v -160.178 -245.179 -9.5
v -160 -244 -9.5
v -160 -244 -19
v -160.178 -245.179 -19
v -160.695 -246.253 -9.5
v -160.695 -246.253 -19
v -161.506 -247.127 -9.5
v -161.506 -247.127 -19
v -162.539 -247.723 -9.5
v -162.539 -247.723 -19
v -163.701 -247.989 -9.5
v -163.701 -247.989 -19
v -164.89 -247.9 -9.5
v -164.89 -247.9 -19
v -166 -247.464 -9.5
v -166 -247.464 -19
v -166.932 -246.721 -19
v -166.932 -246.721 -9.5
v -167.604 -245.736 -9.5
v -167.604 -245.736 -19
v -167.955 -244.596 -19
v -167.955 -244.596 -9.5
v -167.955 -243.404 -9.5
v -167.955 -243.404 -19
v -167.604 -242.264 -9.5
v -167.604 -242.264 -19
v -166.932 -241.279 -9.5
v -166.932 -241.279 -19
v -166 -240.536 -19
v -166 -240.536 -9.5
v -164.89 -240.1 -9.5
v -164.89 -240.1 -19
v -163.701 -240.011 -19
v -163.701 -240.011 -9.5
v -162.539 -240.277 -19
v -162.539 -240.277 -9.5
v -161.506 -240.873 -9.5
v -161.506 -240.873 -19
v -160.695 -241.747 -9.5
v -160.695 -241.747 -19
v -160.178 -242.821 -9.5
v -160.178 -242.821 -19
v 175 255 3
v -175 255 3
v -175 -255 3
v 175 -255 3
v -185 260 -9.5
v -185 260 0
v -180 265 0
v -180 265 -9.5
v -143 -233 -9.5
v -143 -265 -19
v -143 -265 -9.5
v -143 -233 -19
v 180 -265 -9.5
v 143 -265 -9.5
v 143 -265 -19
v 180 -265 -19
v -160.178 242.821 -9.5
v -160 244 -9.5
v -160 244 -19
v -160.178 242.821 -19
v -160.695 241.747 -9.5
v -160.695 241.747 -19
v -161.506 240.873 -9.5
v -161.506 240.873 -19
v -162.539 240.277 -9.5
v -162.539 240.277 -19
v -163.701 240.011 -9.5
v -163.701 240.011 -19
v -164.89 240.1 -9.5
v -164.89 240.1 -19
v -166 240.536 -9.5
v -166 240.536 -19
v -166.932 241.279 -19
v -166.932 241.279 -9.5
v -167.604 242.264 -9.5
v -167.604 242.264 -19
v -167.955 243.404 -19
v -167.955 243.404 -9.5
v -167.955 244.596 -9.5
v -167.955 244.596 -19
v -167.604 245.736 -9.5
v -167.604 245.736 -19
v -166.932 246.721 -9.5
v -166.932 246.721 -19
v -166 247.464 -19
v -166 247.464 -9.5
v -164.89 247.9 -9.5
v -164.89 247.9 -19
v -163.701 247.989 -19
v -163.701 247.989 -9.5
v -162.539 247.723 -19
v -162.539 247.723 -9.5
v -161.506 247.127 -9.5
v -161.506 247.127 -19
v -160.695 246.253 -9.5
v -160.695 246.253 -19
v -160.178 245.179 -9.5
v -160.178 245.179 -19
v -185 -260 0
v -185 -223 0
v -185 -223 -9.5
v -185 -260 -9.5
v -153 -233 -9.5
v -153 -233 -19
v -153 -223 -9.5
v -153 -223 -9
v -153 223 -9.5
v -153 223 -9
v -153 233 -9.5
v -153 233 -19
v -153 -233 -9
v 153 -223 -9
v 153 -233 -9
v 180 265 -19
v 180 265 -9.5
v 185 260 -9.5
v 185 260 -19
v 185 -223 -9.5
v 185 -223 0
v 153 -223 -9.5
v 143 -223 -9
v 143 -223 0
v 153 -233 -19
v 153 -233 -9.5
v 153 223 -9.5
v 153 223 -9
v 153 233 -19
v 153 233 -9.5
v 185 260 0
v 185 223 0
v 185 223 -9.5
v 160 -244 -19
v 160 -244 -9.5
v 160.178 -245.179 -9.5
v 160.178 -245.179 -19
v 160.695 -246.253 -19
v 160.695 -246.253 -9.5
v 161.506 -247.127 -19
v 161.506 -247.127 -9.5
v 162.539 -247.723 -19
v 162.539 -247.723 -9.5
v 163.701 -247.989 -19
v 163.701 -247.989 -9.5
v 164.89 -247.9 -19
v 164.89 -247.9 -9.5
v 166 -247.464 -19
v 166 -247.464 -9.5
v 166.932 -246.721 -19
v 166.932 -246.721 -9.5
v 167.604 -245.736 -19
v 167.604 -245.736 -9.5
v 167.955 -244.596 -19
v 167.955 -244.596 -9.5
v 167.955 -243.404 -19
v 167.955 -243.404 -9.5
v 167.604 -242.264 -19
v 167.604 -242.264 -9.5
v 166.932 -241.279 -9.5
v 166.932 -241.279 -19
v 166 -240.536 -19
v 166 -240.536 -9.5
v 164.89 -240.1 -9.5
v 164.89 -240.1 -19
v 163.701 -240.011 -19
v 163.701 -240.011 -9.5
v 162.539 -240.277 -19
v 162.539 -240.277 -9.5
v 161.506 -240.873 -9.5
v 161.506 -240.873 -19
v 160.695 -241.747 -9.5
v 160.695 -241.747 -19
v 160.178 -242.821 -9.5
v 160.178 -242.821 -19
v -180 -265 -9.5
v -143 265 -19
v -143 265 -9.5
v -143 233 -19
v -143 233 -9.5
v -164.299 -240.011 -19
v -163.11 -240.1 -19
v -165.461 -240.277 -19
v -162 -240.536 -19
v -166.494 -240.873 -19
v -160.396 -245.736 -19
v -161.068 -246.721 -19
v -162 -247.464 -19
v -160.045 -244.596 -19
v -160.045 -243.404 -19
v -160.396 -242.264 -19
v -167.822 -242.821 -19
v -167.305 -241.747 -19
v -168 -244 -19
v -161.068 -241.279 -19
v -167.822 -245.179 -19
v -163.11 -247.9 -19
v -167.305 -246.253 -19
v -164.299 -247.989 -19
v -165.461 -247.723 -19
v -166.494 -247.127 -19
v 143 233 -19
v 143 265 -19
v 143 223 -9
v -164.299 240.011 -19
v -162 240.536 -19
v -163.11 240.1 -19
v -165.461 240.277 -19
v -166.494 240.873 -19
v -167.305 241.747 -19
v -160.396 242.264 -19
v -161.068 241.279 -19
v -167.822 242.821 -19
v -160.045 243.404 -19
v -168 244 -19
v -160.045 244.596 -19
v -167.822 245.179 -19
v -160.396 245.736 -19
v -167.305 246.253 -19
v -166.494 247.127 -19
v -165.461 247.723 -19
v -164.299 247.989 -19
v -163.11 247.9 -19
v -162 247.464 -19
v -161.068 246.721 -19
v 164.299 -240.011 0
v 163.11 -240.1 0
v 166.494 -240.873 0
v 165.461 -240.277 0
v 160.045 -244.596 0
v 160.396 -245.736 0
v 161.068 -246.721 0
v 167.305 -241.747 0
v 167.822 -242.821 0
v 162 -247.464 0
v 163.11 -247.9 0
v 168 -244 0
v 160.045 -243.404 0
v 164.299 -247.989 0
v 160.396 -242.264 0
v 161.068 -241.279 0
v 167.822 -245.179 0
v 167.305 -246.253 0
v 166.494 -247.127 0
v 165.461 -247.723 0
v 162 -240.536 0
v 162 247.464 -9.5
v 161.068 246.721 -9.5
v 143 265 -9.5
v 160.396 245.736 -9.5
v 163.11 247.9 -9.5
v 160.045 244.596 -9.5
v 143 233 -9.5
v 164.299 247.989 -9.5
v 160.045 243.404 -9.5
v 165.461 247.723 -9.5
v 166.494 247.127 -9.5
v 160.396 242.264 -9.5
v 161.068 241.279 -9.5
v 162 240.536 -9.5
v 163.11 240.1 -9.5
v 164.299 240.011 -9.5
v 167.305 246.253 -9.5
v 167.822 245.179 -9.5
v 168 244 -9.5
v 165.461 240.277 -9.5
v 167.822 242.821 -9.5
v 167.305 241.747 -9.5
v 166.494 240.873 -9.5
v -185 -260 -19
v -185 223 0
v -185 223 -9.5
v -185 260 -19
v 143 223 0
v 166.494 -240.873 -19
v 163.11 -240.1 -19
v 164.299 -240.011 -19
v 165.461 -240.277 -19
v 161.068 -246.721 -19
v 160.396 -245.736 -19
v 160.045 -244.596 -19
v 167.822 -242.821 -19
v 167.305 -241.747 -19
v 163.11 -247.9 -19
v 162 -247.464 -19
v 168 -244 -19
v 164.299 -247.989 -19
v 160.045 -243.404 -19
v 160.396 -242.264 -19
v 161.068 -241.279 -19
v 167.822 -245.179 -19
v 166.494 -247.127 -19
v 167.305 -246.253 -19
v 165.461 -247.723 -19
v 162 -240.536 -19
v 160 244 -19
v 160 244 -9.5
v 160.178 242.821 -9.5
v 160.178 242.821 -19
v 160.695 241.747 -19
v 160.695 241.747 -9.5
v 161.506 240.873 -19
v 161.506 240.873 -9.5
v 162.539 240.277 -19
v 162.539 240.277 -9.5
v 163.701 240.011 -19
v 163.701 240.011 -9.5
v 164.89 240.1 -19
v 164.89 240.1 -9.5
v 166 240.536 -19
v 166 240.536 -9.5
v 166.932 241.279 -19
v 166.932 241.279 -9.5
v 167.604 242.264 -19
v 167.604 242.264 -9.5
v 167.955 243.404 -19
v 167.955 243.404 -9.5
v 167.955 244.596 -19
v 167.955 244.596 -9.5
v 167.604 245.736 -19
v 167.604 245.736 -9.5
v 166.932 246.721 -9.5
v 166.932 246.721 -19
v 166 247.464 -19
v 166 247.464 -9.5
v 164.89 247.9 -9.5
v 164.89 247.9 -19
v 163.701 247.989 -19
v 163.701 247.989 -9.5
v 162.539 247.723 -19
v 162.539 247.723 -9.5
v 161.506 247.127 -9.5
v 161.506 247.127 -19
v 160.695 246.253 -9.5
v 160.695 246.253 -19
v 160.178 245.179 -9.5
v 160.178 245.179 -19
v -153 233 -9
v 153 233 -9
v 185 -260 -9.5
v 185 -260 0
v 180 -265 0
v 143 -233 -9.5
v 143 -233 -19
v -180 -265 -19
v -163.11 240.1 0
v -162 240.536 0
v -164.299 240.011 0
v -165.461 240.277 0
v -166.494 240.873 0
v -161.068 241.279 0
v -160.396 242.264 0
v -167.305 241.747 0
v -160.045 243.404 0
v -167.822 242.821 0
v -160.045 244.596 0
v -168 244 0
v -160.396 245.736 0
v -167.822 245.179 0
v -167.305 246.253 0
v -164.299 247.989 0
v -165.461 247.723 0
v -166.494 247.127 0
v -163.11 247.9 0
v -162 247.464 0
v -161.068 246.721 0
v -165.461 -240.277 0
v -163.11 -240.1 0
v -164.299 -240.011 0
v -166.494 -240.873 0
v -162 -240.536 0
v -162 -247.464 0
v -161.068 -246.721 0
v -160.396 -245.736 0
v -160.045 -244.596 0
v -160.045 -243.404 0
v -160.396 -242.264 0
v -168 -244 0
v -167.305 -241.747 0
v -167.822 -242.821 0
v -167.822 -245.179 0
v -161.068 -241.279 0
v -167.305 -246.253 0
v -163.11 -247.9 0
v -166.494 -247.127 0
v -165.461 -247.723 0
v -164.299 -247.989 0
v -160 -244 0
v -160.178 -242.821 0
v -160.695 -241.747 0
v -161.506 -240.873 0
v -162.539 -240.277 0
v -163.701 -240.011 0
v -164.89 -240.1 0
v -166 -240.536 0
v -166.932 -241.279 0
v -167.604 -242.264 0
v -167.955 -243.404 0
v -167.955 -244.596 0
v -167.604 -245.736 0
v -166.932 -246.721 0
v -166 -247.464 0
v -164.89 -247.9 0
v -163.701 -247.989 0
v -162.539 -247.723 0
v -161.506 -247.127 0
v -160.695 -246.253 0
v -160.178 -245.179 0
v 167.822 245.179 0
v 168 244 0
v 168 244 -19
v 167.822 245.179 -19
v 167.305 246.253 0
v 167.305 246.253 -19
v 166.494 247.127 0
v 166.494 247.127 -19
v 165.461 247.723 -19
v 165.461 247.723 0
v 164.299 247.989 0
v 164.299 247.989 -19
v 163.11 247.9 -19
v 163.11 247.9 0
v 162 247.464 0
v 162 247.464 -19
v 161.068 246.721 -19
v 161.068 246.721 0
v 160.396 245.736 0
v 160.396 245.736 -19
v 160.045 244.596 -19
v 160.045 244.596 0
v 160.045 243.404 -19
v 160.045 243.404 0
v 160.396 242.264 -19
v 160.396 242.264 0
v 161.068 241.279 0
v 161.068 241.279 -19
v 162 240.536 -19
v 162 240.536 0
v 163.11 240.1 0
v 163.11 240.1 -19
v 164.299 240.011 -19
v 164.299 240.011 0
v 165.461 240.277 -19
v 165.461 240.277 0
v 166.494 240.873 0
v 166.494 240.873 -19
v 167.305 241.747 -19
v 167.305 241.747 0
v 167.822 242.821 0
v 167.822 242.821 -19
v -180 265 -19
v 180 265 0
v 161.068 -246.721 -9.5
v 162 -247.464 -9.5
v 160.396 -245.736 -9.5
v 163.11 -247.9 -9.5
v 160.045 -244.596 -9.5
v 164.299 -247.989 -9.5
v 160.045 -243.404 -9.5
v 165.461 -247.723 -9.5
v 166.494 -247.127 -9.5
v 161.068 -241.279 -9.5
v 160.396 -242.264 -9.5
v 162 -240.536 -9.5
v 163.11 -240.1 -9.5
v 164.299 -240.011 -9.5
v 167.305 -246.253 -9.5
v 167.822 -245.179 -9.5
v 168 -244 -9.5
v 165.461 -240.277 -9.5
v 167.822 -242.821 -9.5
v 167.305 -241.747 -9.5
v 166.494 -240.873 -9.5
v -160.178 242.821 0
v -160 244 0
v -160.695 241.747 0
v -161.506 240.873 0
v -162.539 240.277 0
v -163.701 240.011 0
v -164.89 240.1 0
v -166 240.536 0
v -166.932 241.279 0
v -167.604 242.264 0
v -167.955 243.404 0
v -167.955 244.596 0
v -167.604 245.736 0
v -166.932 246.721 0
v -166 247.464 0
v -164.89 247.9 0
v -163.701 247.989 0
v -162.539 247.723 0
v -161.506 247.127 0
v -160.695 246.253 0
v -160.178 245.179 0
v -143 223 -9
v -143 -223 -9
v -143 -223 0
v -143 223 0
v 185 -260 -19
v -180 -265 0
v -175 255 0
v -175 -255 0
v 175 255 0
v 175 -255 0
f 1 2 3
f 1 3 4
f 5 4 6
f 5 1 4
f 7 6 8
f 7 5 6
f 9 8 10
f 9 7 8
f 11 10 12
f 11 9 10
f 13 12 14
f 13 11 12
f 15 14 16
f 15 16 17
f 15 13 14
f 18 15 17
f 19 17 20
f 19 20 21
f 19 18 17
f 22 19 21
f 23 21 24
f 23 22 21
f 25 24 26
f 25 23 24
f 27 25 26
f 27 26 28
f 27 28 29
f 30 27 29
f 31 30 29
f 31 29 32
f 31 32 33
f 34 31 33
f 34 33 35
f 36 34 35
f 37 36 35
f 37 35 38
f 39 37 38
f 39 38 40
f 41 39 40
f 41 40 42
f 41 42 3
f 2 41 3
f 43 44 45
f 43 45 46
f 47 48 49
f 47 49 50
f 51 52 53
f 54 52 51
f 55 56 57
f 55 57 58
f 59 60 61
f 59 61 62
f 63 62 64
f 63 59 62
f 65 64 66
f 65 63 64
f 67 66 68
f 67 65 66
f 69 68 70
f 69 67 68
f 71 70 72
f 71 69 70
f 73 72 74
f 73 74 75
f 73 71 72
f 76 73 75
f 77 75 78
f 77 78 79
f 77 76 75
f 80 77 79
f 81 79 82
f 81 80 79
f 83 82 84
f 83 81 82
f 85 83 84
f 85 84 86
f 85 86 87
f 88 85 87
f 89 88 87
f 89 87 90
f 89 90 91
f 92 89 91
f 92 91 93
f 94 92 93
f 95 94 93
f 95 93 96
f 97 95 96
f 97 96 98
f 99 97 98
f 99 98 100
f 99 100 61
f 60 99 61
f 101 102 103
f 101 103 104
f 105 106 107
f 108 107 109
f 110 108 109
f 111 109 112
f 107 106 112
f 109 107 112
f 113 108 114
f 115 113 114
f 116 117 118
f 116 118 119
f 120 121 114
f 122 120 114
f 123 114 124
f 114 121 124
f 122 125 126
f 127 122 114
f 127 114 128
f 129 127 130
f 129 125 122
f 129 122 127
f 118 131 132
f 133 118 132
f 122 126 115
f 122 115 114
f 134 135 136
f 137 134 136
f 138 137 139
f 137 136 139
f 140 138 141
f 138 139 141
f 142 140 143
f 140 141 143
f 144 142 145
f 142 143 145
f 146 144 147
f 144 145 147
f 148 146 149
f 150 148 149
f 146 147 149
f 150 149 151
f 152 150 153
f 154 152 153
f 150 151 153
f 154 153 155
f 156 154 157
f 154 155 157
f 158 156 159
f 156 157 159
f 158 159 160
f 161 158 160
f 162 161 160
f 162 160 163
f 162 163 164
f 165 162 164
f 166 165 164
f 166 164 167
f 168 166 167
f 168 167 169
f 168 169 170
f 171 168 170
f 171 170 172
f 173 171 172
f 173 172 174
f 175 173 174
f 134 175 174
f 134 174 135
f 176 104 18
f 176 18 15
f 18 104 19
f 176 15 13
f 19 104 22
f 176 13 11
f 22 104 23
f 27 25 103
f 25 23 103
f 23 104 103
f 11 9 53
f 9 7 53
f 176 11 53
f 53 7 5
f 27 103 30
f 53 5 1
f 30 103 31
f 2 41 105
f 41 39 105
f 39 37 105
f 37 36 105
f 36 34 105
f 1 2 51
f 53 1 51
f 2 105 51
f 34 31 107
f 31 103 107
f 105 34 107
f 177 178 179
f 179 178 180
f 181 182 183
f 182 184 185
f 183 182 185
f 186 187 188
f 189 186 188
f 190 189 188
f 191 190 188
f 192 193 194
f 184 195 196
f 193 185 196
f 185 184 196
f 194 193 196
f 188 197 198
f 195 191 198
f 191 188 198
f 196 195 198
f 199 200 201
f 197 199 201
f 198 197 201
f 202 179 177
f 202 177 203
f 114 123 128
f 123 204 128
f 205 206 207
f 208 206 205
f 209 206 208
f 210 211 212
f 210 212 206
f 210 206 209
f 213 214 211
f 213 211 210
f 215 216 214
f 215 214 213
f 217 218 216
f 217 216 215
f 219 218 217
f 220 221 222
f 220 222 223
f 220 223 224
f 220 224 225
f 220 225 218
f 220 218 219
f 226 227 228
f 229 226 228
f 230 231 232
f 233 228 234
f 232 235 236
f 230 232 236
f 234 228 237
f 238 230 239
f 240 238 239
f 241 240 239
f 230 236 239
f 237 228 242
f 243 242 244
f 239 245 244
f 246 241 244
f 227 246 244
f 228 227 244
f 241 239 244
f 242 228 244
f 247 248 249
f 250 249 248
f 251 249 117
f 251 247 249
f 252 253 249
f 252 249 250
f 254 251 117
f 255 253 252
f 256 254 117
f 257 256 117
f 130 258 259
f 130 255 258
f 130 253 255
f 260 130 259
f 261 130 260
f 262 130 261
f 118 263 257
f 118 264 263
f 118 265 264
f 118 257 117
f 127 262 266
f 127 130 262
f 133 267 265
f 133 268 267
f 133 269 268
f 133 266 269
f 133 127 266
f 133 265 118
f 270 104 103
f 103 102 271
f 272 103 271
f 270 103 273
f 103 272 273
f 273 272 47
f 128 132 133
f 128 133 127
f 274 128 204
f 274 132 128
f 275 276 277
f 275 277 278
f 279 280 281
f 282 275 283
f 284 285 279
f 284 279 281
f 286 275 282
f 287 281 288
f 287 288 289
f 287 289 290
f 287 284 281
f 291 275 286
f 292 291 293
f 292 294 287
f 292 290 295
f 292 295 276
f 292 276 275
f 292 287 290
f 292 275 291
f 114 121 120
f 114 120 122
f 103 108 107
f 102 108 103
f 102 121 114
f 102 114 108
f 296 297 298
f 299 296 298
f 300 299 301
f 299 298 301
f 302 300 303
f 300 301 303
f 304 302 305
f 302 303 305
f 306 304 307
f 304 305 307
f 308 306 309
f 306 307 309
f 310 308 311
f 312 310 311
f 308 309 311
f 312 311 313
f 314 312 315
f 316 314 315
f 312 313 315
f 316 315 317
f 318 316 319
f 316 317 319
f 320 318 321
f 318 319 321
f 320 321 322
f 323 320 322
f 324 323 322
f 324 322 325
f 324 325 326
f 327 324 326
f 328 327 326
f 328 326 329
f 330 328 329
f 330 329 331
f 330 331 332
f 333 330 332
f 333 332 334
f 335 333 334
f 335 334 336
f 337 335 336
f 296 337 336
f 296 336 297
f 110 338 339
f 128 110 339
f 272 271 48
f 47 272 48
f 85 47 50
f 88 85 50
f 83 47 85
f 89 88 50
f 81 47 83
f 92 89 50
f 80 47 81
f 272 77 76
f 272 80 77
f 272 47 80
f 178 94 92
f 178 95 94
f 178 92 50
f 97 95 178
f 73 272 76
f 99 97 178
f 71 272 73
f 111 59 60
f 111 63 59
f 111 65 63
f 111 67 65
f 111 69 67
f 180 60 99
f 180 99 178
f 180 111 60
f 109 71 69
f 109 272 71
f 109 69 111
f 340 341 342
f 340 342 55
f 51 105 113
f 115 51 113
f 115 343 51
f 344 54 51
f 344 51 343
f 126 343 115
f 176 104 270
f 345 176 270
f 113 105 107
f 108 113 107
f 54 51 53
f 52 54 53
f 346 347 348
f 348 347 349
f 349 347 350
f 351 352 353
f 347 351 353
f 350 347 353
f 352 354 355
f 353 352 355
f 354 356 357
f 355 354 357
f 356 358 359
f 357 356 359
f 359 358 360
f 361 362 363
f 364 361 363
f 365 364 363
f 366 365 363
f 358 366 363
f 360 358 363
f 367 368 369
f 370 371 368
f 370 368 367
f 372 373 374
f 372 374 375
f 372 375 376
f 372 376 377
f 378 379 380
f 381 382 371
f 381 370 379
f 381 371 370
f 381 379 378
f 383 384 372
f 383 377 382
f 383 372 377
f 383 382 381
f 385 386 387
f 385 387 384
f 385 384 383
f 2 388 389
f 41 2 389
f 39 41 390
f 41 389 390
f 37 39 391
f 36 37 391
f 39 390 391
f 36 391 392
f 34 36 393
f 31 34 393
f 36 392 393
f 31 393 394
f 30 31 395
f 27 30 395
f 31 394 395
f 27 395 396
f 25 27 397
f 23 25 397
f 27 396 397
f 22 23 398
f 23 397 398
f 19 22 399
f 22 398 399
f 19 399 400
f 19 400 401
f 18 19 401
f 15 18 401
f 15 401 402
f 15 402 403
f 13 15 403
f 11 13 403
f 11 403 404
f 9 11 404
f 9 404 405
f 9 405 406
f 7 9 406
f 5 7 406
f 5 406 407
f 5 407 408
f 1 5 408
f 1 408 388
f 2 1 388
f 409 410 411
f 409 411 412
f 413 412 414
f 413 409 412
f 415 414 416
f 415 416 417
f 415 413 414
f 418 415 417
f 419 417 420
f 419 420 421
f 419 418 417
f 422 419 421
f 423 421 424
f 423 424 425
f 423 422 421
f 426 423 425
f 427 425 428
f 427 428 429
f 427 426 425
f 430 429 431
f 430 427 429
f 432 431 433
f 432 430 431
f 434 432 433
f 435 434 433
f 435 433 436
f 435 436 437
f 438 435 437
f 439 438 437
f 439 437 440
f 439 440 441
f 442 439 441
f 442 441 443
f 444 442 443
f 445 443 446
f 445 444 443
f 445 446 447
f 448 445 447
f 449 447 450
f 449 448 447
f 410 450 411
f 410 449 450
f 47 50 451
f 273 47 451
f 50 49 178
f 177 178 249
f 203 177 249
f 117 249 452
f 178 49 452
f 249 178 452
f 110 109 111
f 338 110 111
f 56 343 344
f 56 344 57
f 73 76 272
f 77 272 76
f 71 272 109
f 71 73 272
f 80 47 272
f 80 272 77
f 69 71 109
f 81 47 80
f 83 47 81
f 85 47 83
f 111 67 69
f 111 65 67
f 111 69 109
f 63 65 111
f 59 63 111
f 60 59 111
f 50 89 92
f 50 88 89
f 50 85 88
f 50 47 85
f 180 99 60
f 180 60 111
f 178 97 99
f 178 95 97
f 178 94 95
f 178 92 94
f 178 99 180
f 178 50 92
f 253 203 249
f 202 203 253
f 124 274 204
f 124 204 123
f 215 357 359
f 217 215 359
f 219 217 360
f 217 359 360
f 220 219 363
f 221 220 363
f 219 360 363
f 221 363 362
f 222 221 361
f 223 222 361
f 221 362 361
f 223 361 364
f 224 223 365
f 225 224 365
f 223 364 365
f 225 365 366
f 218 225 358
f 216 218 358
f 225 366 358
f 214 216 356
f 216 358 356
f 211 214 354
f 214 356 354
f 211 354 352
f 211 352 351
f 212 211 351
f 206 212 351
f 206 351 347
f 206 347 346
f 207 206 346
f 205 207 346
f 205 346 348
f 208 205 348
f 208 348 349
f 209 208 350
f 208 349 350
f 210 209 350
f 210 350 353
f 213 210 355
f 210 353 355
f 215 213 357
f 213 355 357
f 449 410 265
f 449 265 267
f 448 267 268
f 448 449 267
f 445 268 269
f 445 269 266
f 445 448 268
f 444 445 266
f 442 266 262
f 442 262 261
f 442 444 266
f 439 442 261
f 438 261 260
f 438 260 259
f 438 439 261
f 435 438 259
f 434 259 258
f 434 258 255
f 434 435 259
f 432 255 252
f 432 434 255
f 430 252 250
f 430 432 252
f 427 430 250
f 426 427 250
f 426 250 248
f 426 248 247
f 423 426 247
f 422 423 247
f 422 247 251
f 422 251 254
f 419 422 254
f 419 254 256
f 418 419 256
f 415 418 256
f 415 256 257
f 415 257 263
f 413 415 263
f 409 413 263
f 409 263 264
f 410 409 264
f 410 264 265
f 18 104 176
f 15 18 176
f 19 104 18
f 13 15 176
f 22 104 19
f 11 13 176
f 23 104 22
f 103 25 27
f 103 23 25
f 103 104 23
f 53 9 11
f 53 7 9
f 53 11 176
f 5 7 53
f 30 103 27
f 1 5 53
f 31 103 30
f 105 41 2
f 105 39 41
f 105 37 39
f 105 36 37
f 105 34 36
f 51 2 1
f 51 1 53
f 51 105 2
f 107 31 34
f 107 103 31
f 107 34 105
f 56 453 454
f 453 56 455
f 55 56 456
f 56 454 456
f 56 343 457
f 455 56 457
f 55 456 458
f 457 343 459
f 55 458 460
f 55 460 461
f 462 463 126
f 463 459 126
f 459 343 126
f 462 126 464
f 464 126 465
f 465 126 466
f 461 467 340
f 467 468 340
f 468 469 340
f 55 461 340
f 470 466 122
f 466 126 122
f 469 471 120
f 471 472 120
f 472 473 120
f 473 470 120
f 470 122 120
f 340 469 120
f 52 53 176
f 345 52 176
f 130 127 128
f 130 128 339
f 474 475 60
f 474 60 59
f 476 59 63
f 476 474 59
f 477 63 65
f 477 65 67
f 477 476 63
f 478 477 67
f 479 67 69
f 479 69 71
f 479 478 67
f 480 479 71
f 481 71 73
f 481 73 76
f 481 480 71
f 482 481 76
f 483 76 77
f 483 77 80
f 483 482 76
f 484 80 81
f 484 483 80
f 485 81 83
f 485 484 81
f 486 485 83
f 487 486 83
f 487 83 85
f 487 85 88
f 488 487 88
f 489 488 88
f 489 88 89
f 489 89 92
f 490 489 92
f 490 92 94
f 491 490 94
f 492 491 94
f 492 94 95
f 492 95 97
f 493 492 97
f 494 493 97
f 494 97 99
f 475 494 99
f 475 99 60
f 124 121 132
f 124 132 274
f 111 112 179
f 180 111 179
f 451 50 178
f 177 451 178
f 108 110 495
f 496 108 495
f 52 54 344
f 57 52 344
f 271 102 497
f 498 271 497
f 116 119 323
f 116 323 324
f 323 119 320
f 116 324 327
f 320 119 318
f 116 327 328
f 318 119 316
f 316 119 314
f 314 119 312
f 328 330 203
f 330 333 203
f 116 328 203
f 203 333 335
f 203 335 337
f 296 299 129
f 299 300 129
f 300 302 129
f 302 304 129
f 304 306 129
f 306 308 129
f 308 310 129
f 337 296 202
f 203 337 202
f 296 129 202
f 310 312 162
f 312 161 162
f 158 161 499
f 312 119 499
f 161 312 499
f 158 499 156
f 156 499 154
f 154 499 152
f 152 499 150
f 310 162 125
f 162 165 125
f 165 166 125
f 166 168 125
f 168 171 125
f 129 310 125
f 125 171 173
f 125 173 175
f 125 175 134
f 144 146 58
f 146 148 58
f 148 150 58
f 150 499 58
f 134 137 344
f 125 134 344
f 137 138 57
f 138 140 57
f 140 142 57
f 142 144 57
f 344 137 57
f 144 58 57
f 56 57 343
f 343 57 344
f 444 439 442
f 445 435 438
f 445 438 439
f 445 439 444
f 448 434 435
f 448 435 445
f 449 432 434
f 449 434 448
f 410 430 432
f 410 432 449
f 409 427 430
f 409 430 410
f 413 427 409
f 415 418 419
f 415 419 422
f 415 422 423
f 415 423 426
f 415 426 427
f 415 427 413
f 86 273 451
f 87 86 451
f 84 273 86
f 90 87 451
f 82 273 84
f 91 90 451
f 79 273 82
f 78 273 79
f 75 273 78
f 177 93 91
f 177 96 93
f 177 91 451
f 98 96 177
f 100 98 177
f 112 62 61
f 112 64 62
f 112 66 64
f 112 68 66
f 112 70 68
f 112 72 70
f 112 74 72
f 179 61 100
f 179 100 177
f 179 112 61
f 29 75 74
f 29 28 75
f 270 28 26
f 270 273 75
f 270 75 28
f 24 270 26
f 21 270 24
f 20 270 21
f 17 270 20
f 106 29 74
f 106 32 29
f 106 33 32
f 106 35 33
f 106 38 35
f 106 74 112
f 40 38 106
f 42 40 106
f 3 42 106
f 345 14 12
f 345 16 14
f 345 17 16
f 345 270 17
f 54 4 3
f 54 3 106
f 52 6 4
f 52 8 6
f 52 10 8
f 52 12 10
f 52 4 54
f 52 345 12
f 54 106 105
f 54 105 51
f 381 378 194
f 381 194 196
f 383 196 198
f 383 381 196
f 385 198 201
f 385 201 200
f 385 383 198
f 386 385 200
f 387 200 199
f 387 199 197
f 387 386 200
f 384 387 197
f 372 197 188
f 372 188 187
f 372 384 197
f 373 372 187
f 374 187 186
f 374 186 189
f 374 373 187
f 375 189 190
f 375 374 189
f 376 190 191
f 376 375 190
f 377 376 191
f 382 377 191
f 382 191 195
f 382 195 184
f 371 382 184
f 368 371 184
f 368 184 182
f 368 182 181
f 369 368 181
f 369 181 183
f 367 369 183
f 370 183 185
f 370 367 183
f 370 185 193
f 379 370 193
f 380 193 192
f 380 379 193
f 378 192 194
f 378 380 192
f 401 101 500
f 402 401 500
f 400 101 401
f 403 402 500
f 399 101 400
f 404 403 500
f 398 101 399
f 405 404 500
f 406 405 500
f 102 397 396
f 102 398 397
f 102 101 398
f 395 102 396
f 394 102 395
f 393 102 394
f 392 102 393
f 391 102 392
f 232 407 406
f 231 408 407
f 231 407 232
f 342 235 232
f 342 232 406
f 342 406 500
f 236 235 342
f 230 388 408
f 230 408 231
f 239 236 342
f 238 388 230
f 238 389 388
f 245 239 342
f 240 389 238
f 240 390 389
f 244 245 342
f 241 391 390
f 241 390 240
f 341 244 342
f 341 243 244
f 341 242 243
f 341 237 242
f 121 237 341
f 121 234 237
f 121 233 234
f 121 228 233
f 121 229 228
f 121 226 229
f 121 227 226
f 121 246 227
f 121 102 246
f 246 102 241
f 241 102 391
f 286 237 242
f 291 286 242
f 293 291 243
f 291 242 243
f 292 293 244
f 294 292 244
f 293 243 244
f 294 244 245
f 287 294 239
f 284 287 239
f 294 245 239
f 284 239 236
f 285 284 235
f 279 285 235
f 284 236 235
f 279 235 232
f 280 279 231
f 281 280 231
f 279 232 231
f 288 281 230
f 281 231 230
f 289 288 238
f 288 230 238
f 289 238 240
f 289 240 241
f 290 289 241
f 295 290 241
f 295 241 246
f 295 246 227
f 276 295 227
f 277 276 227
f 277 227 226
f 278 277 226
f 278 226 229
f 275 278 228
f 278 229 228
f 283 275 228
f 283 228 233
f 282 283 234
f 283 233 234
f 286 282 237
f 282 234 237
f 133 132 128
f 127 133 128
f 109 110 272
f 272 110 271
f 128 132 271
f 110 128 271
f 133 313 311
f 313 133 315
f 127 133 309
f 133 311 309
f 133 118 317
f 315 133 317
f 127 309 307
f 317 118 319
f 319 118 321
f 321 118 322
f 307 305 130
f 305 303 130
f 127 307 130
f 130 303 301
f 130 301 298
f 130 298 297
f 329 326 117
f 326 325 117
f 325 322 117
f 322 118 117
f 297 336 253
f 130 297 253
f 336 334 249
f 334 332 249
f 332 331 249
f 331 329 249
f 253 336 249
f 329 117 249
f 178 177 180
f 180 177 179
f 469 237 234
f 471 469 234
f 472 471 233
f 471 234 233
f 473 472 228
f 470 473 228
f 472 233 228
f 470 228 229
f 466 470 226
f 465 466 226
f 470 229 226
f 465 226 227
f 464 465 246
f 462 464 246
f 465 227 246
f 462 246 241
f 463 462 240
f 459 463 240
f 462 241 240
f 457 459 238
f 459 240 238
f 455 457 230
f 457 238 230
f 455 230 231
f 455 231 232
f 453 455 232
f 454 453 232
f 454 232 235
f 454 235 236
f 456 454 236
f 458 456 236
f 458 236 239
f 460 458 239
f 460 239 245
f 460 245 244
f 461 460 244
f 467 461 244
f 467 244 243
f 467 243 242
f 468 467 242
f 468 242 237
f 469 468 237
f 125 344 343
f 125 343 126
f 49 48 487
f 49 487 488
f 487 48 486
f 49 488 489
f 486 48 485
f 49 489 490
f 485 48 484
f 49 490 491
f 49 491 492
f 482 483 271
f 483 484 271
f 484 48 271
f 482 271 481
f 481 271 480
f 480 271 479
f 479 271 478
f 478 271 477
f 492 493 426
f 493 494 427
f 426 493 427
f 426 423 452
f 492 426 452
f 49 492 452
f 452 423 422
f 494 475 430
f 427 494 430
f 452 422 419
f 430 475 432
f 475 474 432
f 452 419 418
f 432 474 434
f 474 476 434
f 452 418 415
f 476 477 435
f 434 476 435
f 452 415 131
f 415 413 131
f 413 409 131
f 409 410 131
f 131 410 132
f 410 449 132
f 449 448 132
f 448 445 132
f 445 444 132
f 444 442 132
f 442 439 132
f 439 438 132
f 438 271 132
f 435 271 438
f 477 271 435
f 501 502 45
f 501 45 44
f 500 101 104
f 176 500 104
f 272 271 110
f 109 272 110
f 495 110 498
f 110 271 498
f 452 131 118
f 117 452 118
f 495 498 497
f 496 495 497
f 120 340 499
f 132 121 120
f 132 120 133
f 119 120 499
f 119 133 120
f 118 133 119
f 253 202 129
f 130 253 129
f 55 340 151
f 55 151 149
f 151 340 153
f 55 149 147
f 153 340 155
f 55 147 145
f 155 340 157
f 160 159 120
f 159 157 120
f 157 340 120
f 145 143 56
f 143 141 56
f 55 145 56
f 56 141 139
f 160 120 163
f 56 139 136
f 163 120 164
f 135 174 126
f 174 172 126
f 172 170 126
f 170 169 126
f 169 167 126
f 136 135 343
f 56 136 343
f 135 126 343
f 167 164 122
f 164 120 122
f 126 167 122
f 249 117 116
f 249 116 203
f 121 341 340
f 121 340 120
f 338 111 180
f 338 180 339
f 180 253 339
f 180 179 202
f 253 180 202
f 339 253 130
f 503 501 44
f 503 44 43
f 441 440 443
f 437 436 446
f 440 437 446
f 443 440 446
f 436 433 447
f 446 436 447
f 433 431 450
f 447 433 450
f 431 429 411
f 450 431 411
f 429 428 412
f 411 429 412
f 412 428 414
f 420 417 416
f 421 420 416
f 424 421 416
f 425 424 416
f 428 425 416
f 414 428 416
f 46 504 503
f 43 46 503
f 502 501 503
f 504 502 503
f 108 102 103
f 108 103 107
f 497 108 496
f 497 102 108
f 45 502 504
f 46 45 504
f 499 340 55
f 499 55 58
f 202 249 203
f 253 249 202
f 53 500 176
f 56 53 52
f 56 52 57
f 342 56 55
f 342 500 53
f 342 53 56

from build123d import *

# Parameters (mm, degrees)
F3_W      = 350
F3_H      = 510
F4_DEPTH  = 3
F5_W      = 350
F5_H      = 32
F5_R      = 4
F6_DEPTH  = 19
F7_W      = 42
F7_H      = 42
F7_R      = 4
F8_DEPTH  = 9.5
F9_SIZE   = 5
F11_W     = 32
F11_H     = 510
F11_R     = 4
F12_DEPTH = 19
F13_W     = 42
F13_H     = 42
F13_R     = 4
F14_DEPTH = 9.5
F15_SIZE  = 5
F17_R     = 4
F18_DEPTH = 19
F22_W     = 306
F22_H     = 466
F22_W_2   = 286
F22_H_2   = 446
F23_DEPTH = 10


# Not quite as in the source:
# - a feature names something its author has since deleted; it is built from what else it names


with BuildPart() as f4:
    # F3 (on Top) → F4 (new body)
    with BuildSketch(Plane.XY):
        Rectangle(F3_W, F3_H)
    extrude(amount=F4_DEPTH)


with BuildPart() as f6:
    # F5 (on face) → F6 (new body)
    with BuildSketch(Plane(origin=(0, 0, 0), x_dir=(1, 0, 0), z_dir=(0, 0, -1))):
        Polygon((-185, -265), (185, -265), (185, -223), (175, -223), (175, -255), (-175, -255), (-175, -223), (-185, -223), align=None)
        with Locations((0, -239)):
            Rectangle(F5_W, F5_H)
        with Locations((-164, -244)):
            Circle(F5_R, mode=Mode.SUBTRACT)
        with Locations((164, -244)):
            Circle(F5_R, mode=Mode.SUBTRACT)
    extrude(amount=F6_DEPTH)

    # F7 (on face) → F8 (cut)
    with BuildSketch(Plane(origin=(0, 0, -19), x_dir=(1, 0, 0), z_dir=(0, 0, -1))):
        with Locations((-164, -244)):
            Rectangle(F7_W, F7_H)
        with Locations((-164, -244)):
            Circle(F7_R, mode=Mode.SUBTRACT)
        with Locations((164, -244)):
            Rectangle(F7_W, F7_H)
        with Locations((164, -244)):
            Circle(F7_R, mode=Mode.SUBTRACT)
    extrude(amount=-F8_DEPTH, mode=Mode.SUBTRACT)

    # F9
    f9_edges = [f6.edges().sort_by_distance(p)[0] for p in [
        (-185, 265, -4.75),
        (185, 265, -4.75),
    ]]
    chamfer(f9_edges, length=F9_SIZE)


with BuildPart() as f10_1:
    # F10: instance of F6
    add(f6.part.mirror(Plane.XZ))


with BuildPart() as f12:
    # F11 (on face) → F12 (new body)
    with BuildSketch(Plane(origin=(0, 0, 0), x_dir=(1, 0, 0), z_dir=(0, 0, -1))):
        Polygon((-143, 265), (-185, 265), (-185, -265), (-143, -265), (-143, -255), (-175, -255), (-175, 255), (-143, 255), align=None)
        with Locations((-159, 0)):
            Rectangle(F11_W, F11_H)
        with Locations((-164, -244)):
            Circle(F11_R, mode=Mode.SUBTRACT)
        with Locations((-164, 244)):
            Circle(F11_R, mode=Mode.SUBTRACT)
    extrude(amount=F12_DEPTH)

    # F13 (on face) → F14 (cut)
    with BuildSketch(Plane.XY):
        with Locations((-164, 244)):
            Rectangle(F13_W, F13_H)
        with Locations((-164, 244)):
            Circle(F13_R, mode=Mode.SUBTRACT)
        with Locations((-164, -244)):
            Rectangle(F13_W, F13_H)
        with Locations((-164, -244)):
            Circle(F13_R, mode=Mode.SUBTRACT)
    extrude(amount=-F14_DEPTH, mode=Mode.SUBTRACT)

    # F15
    f15_edges = [f12.edges().sort_by_distance(p)[0] for p in [
        (-185, -265, -14.25),
        (-185, 265, -14.25),
    ]]
    chamfer(f15_edges, length=F15_SIZE)


with BuildPart() as f16_1:
    # F16: instance of F12
    add(f12.part.mirror(Plane.YZ))


with BuildPart() as f18:
    # F17 (on face) → F18 (new body)
    with BuildSketch(Plane(origin=(0, 0, 0), x_dir=(1, 0, 0), z_dir=(0, 0, -1))):
        with Locations((164, 244)):
            Circle(F17_R)
    extrude(amount=F18_DEPTH)


with BuildPart() as f19_1:
    # F19: instance of F18
    add(f18.part.mirror(Plane.YZ))


with BuildPart() as f20_1:
    # F20: instance of F18
    add(f18.part.mirror(Plane.XZ))


with BuildPart() as f20_2:
    # F20: instance of F19_1
    add(f19_1.part.mirror(Plane.XZ))


with BuildPart() as f23_tool:
    # F22 (on offset) → F23 (new body)
    with BuildSketch(Plane.XY.offset(-19)):
        Rectangle(F22_W, F22_H)
        Rectangle(F22_W_2, F22_H_2, mode=Mode.SUBTRACT)
    extrude(amount=F23_DEPTH)


with BuildPart() as f6_1:
    add(f6.part)

    # F23: cut by f23_tool
    add(f23_tool.part, mode=Mode.SUBTRACT)


with BuildPart() as f10_1_1:
    add(f10_1.part)

    # F23: cut by f23_tool
    add(f23_tool.part, mode=Mode.SUBTRACT)


with BuildPart() as f12_1:
    add(f12.part)

    # F23: cut by f23_tool
    add(f23_tool.part, mode=Mode.SUBTRACT)


with BuildPart() as f16_1_1:
    add(f16_1.part)

    # F23: cut by f23_tool
    add(f23_tool.part, mode=Mode.SUBTRACT)


solid = Compound([f4.part, f18.part, f19_1.part, f20_1.part, f20_2.part, f6_1.part, f10_1_1.part, f12_1.part, f16_1_1.part])
